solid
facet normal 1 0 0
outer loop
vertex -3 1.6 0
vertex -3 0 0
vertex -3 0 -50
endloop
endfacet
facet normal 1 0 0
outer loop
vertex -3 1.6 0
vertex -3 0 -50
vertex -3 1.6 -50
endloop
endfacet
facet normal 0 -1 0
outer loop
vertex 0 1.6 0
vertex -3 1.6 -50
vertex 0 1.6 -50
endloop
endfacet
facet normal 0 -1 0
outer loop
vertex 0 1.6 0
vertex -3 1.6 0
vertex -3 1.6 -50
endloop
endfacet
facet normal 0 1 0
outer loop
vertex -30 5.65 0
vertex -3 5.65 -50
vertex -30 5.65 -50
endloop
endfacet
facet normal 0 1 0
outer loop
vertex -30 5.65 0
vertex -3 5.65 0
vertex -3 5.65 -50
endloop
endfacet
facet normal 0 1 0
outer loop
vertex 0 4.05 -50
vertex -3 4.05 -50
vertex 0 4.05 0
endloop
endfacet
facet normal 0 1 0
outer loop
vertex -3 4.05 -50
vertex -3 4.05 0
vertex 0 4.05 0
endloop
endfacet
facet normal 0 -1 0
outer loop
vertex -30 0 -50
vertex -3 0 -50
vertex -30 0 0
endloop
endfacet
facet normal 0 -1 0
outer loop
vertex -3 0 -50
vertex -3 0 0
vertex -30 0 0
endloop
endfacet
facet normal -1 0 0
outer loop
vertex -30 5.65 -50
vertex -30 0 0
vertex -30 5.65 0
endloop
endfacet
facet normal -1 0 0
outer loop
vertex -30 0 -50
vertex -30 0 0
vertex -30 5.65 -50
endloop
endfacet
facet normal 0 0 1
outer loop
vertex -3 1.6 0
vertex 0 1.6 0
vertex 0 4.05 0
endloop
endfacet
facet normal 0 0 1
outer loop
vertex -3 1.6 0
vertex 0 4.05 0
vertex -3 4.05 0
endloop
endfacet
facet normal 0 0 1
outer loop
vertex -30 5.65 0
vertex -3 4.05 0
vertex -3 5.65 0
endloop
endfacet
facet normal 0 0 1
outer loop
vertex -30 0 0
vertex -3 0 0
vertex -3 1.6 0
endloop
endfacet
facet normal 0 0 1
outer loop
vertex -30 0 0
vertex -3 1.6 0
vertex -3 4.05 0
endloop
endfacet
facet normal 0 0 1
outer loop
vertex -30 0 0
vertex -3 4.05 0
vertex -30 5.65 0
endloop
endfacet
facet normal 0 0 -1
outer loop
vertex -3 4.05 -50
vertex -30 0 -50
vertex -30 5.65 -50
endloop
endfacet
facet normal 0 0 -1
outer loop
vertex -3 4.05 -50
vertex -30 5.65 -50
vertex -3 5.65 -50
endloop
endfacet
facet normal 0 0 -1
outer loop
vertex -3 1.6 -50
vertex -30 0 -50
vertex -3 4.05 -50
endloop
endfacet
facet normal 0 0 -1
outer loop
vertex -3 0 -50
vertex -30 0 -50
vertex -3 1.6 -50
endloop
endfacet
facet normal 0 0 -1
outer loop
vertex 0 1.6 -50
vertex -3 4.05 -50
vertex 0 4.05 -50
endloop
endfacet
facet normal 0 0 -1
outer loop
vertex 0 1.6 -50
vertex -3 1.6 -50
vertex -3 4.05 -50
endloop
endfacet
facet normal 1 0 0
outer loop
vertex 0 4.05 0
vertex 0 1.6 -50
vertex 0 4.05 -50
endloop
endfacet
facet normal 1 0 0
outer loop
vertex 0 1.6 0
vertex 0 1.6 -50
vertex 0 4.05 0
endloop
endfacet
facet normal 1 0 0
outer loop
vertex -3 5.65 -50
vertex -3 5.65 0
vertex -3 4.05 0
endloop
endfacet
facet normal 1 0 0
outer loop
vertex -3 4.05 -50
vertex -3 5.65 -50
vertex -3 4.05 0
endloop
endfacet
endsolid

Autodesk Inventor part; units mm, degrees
ref_plane "YZ Plane" through (0, 0, 0) normal (1, 0, 0) x (0, 1, 0)
ref_plane "XZ Plane" through (0, 0, 0) normal (0, 1, 0) x (-1, 0, 0)
ref_plane "XY Plane" through (0, 0, 0) normal (0, 0, 1) x (1, 0, 0)
sketch "Sketch1" plane through (0, 0, 0) normal (0, 1, 0) x (-1, 0, 0)
  line L0 (0, 0) -> (30, 0)
  line L1 (30, 0) -> (30, -50)
  line L2 (30, -50) -> (0, -50)
  line L3 (0, -50) -> (0, 0)
  dimension "d0" = 30
  dimension "d1" = 50
extrude "Extrusion1" add sketch "Sketch1" along normal blind 5.65
sketch "Sketch2" plane through (-30, 0, 0) normal (0, 0, 1) x (1, 0, 0)
  line L0 (30, 0) -> (0, 0) projected
  line L1 (30, 0) -> (30, 5.65) projected
  line L2 (0, 5.65) -> (30, 5.65) projected
  line L3 (0, 0) -> (0, 5.65) projected
  line L4 (30, 0) -> (0, 0) projected
  line L5 (30, 0) -> (27, 0)
  line L6 (27, 0) -> (27, 1.5)
  line L7 (27, 1.5) -> (30, 1.5)
  line L8 (30, 1.5) -> (30, 0)
  line L9 (30, 5.65) -> (27, 5.65)
  line L10 (27, 5.65) -> (27, 4.15)
  line L11 (27, 4.15) -> (30, 4.15)
  line L12 (30, 4.15) -> (30, 5.65)
  dimension "d4" = 3
  dimension "d5" = 1.5
  dimension "d6" = 3
  dimension "d7" = 1.5
extrude "Extrusion2" cut sketch "Sketch2" against normal up to surface (50 mm away) contours L0 L6 L7 L1 | L11 L10 L2 L1
move faces "Move1" translate (0, -0.1, 0) faces at (-2, 4.15, -16.6667)
move faces "Move2" translate (0, 0.1, 0) faces at (-1, 1.5, -16.6667)
properties part number "Maze Wall Middle"
